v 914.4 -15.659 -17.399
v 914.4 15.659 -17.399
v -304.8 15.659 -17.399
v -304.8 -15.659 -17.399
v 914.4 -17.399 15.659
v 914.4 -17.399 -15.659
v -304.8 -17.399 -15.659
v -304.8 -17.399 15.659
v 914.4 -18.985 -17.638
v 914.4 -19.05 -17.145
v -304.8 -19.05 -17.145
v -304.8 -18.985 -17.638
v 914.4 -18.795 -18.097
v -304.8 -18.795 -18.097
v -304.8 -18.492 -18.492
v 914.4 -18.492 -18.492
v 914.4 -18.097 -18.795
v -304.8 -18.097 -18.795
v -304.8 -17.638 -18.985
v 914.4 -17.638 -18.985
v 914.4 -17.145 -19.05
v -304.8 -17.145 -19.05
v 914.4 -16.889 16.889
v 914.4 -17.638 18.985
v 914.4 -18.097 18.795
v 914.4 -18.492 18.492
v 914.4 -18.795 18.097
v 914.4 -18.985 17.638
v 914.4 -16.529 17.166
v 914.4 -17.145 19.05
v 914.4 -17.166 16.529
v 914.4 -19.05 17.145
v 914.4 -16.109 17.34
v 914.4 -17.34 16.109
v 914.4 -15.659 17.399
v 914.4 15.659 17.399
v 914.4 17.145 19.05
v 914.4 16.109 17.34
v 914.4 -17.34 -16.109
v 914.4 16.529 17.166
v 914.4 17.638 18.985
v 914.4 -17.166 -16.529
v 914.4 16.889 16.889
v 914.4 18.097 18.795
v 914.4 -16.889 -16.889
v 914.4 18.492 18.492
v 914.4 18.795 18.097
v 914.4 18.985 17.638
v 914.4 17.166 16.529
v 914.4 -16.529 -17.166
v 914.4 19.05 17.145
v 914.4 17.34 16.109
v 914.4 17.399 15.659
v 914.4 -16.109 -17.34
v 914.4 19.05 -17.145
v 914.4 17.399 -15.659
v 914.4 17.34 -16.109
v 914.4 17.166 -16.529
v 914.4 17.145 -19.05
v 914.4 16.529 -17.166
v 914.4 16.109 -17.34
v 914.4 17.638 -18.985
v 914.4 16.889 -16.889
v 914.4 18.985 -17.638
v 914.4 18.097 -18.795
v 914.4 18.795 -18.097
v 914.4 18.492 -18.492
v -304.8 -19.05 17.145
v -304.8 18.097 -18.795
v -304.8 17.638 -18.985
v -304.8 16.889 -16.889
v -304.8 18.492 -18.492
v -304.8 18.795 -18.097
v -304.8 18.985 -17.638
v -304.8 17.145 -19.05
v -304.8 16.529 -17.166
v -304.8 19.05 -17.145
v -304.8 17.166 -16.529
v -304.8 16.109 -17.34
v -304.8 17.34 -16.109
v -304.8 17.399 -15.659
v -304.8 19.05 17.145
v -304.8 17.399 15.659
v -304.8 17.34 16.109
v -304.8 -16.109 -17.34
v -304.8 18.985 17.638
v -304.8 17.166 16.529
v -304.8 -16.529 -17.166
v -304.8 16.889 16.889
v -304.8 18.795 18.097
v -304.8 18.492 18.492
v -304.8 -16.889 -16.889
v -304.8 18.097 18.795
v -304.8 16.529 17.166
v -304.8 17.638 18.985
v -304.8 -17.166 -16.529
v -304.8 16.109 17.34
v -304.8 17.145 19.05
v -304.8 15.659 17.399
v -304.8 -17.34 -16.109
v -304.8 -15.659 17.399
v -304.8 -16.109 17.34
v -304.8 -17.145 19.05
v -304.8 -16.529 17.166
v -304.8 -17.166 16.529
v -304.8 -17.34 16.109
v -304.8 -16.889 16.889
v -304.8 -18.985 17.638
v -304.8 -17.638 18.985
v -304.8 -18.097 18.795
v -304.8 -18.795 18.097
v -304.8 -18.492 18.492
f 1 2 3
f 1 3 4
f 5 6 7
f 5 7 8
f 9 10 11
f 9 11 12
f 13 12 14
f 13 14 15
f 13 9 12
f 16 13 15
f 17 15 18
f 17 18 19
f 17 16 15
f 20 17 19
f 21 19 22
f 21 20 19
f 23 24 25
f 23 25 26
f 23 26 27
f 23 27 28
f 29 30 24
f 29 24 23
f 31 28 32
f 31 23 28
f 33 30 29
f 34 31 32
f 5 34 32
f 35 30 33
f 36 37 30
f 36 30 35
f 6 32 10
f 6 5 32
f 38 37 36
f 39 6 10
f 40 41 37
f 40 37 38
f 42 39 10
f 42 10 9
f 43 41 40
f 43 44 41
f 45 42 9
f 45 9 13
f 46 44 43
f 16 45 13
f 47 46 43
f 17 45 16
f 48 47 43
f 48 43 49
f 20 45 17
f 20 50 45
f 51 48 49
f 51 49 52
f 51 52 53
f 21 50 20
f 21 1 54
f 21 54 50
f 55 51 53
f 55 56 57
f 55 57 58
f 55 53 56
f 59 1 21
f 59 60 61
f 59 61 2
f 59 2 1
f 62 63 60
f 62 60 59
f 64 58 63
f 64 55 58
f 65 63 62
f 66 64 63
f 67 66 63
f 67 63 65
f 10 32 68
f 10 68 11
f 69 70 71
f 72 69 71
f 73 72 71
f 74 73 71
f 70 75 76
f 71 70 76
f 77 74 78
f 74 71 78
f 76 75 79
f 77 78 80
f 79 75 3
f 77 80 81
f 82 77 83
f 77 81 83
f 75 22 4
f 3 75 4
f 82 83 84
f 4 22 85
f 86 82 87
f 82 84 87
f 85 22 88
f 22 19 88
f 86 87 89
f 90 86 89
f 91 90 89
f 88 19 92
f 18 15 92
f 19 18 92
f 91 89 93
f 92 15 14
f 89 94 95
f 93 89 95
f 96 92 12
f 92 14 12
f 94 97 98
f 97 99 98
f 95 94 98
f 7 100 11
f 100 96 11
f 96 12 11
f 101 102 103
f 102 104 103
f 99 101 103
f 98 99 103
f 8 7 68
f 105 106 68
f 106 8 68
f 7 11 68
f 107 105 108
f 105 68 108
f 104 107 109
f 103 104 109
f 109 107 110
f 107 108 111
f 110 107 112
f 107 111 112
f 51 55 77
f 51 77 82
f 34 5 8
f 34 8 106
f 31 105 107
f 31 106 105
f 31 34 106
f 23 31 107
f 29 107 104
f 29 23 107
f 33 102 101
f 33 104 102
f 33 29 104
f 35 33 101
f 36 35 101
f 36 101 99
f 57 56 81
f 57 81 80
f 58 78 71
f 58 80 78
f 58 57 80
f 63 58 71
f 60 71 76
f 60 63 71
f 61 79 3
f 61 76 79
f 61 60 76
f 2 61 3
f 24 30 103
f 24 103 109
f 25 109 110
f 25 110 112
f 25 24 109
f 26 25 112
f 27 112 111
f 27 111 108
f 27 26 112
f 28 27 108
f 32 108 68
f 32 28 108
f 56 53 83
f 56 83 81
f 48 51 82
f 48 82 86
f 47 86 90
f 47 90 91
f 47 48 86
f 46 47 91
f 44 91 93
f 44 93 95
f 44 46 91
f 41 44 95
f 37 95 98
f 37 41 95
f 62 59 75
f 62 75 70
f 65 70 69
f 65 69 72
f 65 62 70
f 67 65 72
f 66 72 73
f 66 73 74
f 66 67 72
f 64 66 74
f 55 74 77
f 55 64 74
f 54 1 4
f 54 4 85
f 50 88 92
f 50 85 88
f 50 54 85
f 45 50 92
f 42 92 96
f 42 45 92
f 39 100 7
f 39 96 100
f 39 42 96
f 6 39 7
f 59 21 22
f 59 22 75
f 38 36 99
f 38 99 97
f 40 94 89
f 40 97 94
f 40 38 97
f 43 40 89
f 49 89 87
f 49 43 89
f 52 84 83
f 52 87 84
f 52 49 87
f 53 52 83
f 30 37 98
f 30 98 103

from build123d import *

# Parameters (mm, degrees)
BOSS_EXTRUDE1_DEPTH      = 914.4
BOSS_EXTRUDE1_DEPTH_BACK = 914.4
SKETCH5_W                = 609.6
SKETCH5_H                = 38.1
CUT_EXTRUDE1_DEPTH       = 39.1


with BuildPart() as part:
    # Sketch4 → Boss-Extrude1 (new body, two sides)
    with BuildSketch(Plane(origin=(0, 0, 0), x_dir=(0, 0, -1), z_dir=(1, 0, 0))) as boss_extrude1_sk:
        with BuildLine():
            Line((19.05, -17.145), (19.05, 17.145))
            ThreePointArc((19.05, 17.145), (18.492038418, 18.492038418), (17.145, 19.05))
            Line((17.145, 19.05), (-17.145, 19.05))
            ThreePointArc((-17.145, 19.05), (-18.492038418, 18.492038418), (-19.05, 17.145))
            Line((-19.05, 17.145), (-19.05, -17.145))
            ThreePointArc((-19.05, -17.145), (-18.492038418, -18.492038418), (-17.145, -19.05))
            Line((-17.145, -19.05), (17.145, -19.05))
            ThreePointArc((17.145, -19.05), (18.492038418, -18.492038418), (19.05, -17.145))
        make_face()
        with BuildLine():
            Line((17.399, 15.6591), (17.399, -15.6591))
            ThreePointArc((17.399, -15.6591), (16.889395089, -16.889395089), (15.6591, -17.399))
            Line((15.6591, -17.399), (-15.6591, -17.399))
            ThreePointArc((-15.6591, -17.399), (-16.889395089, -16.889395089), (-17.399, -15.6591))
            Line((-17.399, -15.6591), (-17.399, 15.6591))
            ThreePointArc((-17.399, 15.6591), (-16.889395089, 16.889395089), (-15.6591, 17.399))
            Line((-15.6591, 17.399), (15.6591, 17.399))
            ThreePointArc((15.6591, 17.399), (16.889395089, 16.889395089), (17.399, 15.6591))
        make_face(mode=Mode.SUBTRACT)
    extrude(amount=BOSS_EXTRUDE1_DEPTH)
    extrude(boss_extrude1_sk.sketch, amount=-BOSS_EXTRUDE1_DEPTH_BACK)

    # Sketch5 → Cut-Extrude1 (cut, through all)
    with BuildSketch(Plane.XZ.offset(19.05)):
        with Locations((-609.6, 0)):
            Rectangle(SKETCH5_W, SKETCH5_H)
    extrude(amount=-CUT_EXTRUDE1_DEPTH, mode=Mode.SUBTRACT)


solid = part.part
